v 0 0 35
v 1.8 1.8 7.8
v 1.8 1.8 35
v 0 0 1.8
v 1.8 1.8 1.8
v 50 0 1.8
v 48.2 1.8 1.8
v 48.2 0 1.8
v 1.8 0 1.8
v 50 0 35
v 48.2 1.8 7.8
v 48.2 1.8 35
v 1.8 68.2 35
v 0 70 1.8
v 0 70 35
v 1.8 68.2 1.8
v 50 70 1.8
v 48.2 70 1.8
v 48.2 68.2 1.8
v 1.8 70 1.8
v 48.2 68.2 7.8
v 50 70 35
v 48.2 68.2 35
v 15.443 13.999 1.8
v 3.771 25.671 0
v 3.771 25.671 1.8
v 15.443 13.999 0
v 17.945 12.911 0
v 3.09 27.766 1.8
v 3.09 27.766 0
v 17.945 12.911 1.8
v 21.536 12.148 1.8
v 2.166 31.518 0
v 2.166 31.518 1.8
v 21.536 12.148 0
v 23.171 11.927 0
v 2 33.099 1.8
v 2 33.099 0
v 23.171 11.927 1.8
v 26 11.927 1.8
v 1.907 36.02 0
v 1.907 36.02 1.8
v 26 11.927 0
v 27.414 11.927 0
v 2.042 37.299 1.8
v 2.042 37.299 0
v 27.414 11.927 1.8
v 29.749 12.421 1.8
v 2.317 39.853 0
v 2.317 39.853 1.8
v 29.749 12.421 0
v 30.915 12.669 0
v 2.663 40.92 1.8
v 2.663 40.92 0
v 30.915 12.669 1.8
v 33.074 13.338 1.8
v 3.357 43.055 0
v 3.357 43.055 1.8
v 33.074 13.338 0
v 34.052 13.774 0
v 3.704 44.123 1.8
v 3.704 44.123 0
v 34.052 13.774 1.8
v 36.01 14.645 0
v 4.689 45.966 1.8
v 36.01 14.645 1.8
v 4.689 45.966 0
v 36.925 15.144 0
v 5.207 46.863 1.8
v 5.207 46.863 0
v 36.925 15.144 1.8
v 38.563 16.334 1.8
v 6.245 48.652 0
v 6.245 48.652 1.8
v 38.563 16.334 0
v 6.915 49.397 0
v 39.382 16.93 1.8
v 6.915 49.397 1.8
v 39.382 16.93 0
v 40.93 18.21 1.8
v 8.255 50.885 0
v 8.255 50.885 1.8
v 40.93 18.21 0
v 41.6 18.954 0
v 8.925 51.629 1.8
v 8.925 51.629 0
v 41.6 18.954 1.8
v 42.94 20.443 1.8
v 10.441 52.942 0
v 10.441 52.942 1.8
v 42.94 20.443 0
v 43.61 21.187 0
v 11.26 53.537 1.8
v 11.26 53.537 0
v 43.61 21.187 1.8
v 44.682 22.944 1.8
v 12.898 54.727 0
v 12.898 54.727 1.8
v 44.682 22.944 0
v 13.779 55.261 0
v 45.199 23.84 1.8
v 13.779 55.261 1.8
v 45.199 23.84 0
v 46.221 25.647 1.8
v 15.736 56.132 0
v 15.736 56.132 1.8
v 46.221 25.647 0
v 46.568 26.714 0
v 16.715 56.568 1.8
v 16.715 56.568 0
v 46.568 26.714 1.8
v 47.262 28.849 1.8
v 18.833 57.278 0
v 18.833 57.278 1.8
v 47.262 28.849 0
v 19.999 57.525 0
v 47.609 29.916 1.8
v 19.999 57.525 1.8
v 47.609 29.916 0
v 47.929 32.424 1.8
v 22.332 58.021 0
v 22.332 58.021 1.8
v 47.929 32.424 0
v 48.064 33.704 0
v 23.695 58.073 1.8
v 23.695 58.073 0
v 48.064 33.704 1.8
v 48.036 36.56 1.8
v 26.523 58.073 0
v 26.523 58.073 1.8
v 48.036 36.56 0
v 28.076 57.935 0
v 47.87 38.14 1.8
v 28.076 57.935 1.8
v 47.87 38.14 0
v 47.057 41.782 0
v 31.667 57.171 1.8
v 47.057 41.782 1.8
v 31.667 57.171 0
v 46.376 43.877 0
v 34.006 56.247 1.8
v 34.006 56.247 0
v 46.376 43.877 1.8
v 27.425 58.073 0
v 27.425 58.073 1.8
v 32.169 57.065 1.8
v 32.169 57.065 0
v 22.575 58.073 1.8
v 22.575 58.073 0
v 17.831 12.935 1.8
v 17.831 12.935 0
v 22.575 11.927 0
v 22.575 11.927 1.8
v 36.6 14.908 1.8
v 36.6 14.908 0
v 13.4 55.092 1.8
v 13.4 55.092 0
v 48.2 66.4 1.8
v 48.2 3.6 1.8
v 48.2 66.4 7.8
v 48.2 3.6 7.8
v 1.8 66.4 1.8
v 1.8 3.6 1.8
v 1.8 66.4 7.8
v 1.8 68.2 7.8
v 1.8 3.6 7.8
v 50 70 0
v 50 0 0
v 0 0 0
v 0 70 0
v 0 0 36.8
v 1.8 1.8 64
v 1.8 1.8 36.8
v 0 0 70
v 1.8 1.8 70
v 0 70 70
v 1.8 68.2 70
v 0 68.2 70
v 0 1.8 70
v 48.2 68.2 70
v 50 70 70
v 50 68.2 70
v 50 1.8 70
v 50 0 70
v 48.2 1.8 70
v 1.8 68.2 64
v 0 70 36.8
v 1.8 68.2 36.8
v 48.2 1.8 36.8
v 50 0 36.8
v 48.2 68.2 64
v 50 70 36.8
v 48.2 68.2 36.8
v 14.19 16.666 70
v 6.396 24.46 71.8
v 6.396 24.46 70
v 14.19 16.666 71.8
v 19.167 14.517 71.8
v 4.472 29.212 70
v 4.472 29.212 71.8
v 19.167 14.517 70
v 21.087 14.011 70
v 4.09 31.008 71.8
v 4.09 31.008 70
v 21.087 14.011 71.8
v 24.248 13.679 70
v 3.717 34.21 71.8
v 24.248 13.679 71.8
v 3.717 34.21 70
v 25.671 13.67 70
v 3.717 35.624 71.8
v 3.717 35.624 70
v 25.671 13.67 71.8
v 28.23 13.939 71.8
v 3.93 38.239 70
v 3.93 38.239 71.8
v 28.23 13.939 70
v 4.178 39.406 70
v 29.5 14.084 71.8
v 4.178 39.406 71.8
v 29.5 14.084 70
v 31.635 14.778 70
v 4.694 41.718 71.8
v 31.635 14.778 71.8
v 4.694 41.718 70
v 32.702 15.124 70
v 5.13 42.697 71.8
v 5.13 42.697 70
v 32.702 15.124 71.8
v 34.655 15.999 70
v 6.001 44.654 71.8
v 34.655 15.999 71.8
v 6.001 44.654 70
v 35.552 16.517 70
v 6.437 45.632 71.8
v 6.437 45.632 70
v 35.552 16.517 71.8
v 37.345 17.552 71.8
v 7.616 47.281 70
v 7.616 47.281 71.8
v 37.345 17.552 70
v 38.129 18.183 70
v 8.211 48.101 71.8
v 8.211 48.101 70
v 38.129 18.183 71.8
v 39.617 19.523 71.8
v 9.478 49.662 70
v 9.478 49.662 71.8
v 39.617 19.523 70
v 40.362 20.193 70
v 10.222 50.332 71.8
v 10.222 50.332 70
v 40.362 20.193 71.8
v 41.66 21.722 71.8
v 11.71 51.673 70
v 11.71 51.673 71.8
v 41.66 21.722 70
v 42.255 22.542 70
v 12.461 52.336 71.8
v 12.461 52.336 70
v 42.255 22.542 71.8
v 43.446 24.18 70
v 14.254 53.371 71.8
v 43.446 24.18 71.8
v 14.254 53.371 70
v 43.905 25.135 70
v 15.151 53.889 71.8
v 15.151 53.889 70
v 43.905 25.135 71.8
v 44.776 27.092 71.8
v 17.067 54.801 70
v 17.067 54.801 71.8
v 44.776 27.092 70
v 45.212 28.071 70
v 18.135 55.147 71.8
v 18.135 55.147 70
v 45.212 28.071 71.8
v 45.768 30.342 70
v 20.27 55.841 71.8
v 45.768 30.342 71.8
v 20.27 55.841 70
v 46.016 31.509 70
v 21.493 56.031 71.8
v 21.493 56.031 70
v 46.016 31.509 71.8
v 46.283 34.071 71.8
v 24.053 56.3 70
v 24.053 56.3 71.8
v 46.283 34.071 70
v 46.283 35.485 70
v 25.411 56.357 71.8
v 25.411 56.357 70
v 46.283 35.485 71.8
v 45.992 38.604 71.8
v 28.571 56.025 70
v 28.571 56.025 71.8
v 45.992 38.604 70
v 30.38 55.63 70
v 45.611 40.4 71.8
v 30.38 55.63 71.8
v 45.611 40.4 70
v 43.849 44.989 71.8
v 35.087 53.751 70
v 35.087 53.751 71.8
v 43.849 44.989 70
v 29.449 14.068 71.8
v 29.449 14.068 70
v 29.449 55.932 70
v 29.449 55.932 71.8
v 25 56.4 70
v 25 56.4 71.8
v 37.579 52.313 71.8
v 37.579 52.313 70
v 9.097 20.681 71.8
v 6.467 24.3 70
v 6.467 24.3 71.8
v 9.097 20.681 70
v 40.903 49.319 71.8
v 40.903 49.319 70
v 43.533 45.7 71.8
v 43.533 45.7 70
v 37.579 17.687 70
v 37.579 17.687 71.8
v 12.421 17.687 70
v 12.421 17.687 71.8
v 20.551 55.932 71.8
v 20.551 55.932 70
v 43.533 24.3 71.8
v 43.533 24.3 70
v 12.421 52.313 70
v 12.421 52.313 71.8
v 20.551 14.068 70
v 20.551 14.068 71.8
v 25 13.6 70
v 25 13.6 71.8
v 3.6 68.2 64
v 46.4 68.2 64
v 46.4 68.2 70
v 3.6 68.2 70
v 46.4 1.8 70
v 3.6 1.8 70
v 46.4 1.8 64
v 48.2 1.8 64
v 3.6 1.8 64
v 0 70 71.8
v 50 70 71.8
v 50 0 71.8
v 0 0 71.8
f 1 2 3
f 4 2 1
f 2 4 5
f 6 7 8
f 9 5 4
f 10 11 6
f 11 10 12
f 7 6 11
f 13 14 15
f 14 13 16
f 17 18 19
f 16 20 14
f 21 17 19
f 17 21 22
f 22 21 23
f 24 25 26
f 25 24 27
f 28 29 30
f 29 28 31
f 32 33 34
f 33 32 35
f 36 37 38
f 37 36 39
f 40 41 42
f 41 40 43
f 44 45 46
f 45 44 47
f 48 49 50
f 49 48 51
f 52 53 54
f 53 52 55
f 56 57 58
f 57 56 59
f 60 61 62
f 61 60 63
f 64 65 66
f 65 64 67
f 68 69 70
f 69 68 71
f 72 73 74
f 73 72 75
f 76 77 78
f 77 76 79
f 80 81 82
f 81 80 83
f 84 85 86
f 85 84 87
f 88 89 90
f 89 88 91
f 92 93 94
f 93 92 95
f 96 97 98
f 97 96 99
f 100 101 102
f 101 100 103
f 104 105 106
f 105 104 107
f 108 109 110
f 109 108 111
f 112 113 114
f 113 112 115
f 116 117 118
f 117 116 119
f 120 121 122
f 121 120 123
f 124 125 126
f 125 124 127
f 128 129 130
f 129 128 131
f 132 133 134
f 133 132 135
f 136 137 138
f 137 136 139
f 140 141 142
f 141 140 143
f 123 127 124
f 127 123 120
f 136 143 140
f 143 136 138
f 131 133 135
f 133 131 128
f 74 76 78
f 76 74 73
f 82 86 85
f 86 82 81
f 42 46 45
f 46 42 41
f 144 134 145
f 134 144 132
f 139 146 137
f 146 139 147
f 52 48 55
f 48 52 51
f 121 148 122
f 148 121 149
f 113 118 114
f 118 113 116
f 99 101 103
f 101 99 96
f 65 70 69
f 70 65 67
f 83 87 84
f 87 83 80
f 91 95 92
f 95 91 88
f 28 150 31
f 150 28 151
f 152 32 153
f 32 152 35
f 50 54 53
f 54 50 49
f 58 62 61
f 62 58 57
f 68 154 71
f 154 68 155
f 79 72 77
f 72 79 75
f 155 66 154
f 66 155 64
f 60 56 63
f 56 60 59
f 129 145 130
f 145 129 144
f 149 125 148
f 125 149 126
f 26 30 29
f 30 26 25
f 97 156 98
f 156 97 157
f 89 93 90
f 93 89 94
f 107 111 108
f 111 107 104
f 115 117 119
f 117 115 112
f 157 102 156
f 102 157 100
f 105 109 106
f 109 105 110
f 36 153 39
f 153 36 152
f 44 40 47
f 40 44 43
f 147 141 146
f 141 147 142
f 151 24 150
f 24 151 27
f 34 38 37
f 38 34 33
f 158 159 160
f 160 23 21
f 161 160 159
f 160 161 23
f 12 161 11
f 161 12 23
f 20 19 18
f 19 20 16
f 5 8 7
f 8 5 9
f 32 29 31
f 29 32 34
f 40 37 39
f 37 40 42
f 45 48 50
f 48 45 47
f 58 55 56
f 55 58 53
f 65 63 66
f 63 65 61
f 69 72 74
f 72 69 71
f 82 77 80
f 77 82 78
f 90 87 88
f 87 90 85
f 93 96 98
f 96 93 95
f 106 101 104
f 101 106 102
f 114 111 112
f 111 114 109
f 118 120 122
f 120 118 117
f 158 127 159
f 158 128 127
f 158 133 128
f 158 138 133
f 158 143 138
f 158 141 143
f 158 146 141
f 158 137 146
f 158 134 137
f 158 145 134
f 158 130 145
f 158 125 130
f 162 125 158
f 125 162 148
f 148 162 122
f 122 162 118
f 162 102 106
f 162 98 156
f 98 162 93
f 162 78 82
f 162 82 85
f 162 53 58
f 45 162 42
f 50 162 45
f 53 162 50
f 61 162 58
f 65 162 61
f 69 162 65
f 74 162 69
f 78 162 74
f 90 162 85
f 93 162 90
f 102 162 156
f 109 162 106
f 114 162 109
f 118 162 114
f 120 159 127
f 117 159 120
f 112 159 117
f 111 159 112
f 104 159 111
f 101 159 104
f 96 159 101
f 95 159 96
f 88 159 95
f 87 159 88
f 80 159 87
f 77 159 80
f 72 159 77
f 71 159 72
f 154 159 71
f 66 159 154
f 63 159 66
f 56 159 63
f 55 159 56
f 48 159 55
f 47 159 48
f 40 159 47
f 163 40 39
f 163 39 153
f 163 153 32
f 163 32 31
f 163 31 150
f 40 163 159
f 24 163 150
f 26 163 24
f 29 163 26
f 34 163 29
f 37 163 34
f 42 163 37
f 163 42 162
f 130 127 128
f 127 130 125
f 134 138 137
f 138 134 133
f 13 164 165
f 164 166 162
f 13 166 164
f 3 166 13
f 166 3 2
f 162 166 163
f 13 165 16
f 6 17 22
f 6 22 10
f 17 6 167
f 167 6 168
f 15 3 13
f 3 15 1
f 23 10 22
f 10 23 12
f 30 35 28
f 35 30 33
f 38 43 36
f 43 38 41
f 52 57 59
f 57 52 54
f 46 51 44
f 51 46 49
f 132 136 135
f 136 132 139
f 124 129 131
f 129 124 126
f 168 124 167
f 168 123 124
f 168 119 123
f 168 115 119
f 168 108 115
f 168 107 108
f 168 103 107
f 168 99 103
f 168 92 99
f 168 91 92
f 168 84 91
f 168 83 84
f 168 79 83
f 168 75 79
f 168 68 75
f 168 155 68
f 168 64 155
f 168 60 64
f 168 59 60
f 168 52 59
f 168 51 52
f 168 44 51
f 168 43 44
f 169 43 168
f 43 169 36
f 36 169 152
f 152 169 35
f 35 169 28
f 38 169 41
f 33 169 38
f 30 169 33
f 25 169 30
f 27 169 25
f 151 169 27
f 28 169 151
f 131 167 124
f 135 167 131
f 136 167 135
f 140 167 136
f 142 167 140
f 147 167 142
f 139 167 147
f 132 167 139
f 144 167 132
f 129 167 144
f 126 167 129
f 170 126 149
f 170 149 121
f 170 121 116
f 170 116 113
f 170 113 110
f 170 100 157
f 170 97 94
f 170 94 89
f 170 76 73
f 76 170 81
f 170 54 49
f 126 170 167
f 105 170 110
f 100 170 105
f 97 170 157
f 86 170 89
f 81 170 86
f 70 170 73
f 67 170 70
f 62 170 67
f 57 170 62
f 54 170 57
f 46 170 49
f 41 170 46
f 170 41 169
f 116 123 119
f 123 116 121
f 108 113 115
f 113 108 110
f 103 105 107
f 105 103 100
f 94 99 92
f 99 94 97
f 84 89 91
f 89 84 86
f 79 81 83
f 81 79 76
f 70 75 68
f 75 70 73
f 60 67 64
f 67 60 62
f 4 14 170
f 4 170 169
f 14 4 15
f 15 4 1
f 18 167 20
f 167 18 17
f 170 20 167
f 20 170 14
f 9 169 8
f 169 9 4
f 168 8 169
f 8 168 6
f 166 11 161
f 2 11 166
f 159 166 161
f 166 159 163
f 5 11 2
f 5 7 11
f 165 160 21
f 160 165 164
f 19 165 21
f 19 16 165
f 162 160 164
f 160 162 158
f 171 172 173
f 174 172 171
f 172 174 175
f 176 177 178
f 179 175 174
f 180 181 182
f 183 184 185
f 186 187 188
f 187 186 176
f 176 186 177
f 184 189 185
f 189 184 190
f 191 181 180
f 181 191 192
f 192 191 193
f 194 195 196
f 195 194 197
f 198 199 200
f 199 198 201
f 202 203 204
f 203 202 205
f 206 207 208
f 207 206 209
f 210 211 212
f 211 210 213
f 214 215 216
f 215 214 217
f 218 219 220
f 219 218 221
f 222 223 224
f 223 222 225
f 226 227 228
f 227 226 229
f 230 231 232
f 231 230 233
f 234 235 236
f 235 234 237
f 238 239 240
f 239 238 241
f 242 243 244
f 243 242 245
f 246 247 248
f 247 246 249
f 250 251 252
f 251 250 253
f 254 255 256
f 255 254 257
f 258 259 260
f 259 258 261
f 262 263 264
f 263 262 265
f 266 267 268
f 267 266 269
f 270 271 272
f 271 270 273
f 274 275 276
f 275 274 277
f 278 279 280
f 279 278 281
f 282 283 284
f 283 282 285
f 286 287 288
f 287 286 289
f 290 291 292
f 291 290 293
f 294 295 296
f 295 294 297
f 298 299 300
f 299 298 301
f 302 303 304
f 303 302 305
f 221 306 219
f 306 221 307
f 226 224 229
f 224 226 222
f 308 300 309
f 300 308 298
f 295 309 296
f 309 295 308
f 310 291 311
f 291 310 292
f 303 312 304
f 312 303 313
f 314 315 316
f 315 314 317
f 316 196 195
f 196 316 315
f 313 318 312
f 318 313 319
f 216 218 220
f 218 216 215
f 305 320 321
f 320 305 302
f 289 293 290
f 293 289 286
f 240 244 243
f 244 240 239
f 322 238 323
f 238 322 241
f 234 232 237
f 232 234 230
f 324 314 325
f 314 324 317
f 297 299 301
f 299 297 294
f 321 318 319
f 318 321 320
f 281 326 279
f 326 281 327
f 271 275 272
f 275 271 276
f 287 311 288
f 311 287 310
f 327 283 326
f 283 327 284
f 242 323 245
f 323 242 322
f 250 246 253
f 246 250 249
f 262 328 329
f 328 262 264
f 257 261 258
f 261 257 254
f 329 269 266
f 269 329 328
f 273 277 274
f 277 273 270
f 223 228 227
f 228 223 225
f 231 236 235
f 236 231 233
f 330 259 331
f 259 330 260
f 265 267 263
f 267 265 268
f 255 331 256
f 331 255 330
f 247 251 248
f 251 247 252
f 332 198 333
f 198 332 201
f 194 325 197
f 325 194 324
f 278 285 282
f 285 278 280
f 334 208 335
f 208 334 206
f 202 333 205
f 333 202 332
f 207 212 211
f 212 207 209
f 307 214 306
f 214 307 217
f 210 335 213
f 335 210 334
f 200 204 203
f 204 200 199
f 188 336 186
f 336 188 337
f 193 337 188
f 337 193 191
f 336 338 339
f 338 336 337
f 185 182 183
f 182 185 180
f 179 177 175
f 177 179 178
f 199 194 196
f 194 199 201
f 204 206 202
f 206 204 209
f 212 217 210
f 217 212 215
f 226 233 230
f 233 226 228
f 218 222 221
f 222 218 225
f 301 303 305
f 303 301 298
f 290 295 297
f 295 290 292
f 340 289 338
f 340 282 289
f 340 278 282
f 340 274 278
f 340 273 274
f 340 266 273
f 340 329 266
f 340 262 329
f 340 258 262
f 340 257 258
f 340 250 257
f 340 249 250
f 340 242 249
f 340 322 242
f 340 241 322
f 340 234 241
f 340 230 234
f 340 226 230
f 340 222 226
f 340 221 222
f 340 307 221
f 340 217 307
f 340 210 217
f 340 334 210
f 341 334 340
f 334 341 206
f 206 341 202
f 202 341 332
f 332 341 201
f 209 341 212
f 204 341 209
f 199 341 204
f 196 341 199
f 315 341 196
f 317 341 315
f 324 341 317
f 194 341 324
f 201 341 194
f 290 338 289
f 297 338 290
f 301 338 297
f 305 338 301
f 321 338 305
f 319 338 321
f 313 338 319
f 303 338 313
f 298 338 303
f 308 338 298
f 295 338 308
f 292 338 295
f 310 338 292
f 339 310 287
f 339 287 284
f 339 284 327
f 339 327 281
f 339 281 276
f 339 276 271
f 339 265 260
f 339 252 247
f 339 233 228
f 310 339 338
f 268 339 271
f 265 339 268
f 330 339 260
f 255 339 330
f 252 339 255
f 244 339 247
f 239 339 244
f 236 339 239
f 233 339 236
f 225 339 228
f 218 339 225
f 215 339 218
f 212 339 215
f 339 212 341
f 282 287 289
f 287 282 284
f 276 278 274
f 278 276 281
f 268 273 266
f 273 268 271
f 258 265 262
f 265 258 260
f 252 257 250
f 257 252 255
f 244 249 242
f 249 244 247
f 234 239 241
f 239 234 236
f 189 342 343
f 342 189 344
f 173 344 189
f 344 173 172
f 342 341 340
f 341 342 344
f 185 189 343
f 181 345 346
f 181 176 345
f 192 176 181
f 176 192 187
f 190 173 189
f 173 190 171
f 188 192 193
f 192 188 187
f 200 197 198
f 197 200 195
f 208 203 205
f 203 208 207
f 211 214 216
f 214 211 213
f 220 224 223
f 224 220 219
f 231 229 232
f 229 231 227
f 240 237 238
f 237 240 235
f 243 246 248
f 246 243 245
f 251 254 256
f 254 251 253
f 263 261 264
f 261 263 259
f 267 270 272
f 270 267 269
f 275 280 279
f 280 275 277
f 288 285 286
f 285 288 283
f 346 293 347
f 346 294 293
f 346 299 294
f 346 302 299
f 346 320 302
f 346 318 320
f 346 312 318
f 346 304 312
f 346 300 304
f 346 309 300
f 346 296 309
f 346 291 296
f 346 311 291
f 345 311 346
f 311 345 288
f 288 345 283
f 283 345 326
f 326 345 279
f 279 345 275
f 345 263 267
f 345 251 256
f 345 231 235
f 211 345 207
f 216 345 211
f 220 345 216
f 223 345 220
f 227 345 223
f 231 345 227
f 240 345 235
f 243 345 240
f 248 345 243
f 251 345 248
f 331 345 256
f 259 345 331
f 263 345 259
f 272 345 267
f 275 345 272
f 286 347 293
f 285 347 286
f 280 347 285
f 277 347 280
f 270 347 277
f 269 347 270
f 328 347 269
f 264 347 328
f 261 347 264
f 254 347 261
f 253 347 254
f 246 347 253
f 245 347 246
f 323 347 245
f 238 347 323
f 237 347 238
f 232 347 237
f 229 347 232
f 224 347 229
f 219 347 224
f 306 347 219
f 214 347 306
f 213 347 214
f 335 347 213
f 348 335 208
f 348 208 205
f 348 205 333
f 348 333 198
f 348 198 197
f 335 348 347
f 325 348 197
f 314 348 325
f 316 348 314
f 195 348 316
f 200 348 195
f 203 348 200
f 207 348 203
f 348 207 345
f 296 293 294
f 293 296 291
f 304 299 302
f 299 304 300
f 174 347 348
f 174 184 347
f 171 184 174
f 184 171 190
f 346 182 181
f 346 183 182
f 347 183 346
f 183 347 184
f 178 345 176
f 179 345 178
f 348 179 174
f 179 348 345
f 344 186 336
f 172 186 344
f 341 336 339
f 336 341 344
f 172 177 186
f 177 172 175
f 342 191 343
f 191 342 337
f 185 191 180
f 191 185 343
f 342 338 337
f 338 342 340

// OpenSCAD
/* [Dimensions] */

//How to render the view
part = "composite"; // [top:Top only,bottom:Bottom Only,both:Both (printable),composition:Both (preview)]

//Outer width of the box
width = 50;

//Outer depth of the box
depth = 70;

//Outer height of the box
height = 35;

/* [Extra] */

//Wall thickness
thickness = 1.8;

//Height of the overlaping sections
overlap = 6;

/* [Vents] */

//Type of the vent hole
vent_type = "circle"; //[circle:Circular vents,square:Squared vents]

//Angle of the vent pattern
vent_angle = 45; //[0:89]

//Width of the vent ribbs (set to 0 to disable vents)
vent_w = 1; //[0:0.1:10]

//Space between vent ribbs (set to 0 for solid hole)
vent_spc = 2; //[0:0.1:10]

module half_box(width=70, depth=70, height=25, thickness=1.8, overlap=6) {
    
  difference() {
    //body
    cube([width,depth,height]);
      
    union() {
      //inner space
      translate([thickness,-1,thickness])
        cube([width-2*thickness,depth+2,height]);

      //chamfering
      x = sqrt(2)*width/2;
      translate([width/2,0,0])
      translate([0,0,thickness+height/2]) {
        rotate([0,0,45])
          cube([x,x,height], center=true);
      
        translate([0,depth,0])
        rotate([0,0,45])
          cube([x,x,height], center=true);
      }
      
      //vents
      translate([thickness,2*thickness,-1])
        inverted_vents(width-2*thickness, depth-4*thickness, thickness+2);
    }
      
  }
  
  //overlaps
  overlap = min(overlap, height/2-thickness);
  translate([thickness/2,thickness,thickness])
    cube([width-thickness,thickness,overlap]);  
  translate([thickness/2,depth-2*thickness, thickness])
    cube([width-thickness,thickness,overlap]);  
}

module inverted_vents(width=70, depth=70, height=1.8, angle=vent_angle, ribb_w=vent_spc, ribb_spc=vent_w) {


    x_spc = (ribb_w + ribb_spc) / cos(angle);    
    y=(depth+ribb_w)/cos(angle)+ribb_w;
    x_max = width + tan(angle) * depth;

    difference() {
        if (vent_type == "circle") {
           translate([width/2,depth/2,0])
             cylinder(d=min(width,depth), h=height);
        } else {
           cube([width,depth,height]);
        }
    
        for (x = [0: x_spc : x_max]) {    
            translate([x,0,0])    
            rotate([0,0,angle])
            translate([0,-ribb_w*tan(angle),-1])
                cube([ribb_w,y,height+2]);
        }
    }
}


module bottom() {
  half_box(width, depth, height, thickness, overlap);
}

module top() {
  rotate([0,0,90])
    half_box(depth, width, height, thickness, overlap);
}

module both() {
   top();
   translate([thickness,0,0])
     bottom();
}

module composite() {
  half_box(width, depth, height, thickness, overlap);    
    
  translate([0,0,2*height+thickness])
  rotate([180,0,90])
    half_box(depth, width, height, thickness, overlap);
}

module print_part() {
    if (part == "top") {
        top();
    } else if (part == "bottom") {
        bottom();
    } else if (part == "both") {
        both();
    } else {
        composite();
    }
}

print_part();
//inverted_vents();
